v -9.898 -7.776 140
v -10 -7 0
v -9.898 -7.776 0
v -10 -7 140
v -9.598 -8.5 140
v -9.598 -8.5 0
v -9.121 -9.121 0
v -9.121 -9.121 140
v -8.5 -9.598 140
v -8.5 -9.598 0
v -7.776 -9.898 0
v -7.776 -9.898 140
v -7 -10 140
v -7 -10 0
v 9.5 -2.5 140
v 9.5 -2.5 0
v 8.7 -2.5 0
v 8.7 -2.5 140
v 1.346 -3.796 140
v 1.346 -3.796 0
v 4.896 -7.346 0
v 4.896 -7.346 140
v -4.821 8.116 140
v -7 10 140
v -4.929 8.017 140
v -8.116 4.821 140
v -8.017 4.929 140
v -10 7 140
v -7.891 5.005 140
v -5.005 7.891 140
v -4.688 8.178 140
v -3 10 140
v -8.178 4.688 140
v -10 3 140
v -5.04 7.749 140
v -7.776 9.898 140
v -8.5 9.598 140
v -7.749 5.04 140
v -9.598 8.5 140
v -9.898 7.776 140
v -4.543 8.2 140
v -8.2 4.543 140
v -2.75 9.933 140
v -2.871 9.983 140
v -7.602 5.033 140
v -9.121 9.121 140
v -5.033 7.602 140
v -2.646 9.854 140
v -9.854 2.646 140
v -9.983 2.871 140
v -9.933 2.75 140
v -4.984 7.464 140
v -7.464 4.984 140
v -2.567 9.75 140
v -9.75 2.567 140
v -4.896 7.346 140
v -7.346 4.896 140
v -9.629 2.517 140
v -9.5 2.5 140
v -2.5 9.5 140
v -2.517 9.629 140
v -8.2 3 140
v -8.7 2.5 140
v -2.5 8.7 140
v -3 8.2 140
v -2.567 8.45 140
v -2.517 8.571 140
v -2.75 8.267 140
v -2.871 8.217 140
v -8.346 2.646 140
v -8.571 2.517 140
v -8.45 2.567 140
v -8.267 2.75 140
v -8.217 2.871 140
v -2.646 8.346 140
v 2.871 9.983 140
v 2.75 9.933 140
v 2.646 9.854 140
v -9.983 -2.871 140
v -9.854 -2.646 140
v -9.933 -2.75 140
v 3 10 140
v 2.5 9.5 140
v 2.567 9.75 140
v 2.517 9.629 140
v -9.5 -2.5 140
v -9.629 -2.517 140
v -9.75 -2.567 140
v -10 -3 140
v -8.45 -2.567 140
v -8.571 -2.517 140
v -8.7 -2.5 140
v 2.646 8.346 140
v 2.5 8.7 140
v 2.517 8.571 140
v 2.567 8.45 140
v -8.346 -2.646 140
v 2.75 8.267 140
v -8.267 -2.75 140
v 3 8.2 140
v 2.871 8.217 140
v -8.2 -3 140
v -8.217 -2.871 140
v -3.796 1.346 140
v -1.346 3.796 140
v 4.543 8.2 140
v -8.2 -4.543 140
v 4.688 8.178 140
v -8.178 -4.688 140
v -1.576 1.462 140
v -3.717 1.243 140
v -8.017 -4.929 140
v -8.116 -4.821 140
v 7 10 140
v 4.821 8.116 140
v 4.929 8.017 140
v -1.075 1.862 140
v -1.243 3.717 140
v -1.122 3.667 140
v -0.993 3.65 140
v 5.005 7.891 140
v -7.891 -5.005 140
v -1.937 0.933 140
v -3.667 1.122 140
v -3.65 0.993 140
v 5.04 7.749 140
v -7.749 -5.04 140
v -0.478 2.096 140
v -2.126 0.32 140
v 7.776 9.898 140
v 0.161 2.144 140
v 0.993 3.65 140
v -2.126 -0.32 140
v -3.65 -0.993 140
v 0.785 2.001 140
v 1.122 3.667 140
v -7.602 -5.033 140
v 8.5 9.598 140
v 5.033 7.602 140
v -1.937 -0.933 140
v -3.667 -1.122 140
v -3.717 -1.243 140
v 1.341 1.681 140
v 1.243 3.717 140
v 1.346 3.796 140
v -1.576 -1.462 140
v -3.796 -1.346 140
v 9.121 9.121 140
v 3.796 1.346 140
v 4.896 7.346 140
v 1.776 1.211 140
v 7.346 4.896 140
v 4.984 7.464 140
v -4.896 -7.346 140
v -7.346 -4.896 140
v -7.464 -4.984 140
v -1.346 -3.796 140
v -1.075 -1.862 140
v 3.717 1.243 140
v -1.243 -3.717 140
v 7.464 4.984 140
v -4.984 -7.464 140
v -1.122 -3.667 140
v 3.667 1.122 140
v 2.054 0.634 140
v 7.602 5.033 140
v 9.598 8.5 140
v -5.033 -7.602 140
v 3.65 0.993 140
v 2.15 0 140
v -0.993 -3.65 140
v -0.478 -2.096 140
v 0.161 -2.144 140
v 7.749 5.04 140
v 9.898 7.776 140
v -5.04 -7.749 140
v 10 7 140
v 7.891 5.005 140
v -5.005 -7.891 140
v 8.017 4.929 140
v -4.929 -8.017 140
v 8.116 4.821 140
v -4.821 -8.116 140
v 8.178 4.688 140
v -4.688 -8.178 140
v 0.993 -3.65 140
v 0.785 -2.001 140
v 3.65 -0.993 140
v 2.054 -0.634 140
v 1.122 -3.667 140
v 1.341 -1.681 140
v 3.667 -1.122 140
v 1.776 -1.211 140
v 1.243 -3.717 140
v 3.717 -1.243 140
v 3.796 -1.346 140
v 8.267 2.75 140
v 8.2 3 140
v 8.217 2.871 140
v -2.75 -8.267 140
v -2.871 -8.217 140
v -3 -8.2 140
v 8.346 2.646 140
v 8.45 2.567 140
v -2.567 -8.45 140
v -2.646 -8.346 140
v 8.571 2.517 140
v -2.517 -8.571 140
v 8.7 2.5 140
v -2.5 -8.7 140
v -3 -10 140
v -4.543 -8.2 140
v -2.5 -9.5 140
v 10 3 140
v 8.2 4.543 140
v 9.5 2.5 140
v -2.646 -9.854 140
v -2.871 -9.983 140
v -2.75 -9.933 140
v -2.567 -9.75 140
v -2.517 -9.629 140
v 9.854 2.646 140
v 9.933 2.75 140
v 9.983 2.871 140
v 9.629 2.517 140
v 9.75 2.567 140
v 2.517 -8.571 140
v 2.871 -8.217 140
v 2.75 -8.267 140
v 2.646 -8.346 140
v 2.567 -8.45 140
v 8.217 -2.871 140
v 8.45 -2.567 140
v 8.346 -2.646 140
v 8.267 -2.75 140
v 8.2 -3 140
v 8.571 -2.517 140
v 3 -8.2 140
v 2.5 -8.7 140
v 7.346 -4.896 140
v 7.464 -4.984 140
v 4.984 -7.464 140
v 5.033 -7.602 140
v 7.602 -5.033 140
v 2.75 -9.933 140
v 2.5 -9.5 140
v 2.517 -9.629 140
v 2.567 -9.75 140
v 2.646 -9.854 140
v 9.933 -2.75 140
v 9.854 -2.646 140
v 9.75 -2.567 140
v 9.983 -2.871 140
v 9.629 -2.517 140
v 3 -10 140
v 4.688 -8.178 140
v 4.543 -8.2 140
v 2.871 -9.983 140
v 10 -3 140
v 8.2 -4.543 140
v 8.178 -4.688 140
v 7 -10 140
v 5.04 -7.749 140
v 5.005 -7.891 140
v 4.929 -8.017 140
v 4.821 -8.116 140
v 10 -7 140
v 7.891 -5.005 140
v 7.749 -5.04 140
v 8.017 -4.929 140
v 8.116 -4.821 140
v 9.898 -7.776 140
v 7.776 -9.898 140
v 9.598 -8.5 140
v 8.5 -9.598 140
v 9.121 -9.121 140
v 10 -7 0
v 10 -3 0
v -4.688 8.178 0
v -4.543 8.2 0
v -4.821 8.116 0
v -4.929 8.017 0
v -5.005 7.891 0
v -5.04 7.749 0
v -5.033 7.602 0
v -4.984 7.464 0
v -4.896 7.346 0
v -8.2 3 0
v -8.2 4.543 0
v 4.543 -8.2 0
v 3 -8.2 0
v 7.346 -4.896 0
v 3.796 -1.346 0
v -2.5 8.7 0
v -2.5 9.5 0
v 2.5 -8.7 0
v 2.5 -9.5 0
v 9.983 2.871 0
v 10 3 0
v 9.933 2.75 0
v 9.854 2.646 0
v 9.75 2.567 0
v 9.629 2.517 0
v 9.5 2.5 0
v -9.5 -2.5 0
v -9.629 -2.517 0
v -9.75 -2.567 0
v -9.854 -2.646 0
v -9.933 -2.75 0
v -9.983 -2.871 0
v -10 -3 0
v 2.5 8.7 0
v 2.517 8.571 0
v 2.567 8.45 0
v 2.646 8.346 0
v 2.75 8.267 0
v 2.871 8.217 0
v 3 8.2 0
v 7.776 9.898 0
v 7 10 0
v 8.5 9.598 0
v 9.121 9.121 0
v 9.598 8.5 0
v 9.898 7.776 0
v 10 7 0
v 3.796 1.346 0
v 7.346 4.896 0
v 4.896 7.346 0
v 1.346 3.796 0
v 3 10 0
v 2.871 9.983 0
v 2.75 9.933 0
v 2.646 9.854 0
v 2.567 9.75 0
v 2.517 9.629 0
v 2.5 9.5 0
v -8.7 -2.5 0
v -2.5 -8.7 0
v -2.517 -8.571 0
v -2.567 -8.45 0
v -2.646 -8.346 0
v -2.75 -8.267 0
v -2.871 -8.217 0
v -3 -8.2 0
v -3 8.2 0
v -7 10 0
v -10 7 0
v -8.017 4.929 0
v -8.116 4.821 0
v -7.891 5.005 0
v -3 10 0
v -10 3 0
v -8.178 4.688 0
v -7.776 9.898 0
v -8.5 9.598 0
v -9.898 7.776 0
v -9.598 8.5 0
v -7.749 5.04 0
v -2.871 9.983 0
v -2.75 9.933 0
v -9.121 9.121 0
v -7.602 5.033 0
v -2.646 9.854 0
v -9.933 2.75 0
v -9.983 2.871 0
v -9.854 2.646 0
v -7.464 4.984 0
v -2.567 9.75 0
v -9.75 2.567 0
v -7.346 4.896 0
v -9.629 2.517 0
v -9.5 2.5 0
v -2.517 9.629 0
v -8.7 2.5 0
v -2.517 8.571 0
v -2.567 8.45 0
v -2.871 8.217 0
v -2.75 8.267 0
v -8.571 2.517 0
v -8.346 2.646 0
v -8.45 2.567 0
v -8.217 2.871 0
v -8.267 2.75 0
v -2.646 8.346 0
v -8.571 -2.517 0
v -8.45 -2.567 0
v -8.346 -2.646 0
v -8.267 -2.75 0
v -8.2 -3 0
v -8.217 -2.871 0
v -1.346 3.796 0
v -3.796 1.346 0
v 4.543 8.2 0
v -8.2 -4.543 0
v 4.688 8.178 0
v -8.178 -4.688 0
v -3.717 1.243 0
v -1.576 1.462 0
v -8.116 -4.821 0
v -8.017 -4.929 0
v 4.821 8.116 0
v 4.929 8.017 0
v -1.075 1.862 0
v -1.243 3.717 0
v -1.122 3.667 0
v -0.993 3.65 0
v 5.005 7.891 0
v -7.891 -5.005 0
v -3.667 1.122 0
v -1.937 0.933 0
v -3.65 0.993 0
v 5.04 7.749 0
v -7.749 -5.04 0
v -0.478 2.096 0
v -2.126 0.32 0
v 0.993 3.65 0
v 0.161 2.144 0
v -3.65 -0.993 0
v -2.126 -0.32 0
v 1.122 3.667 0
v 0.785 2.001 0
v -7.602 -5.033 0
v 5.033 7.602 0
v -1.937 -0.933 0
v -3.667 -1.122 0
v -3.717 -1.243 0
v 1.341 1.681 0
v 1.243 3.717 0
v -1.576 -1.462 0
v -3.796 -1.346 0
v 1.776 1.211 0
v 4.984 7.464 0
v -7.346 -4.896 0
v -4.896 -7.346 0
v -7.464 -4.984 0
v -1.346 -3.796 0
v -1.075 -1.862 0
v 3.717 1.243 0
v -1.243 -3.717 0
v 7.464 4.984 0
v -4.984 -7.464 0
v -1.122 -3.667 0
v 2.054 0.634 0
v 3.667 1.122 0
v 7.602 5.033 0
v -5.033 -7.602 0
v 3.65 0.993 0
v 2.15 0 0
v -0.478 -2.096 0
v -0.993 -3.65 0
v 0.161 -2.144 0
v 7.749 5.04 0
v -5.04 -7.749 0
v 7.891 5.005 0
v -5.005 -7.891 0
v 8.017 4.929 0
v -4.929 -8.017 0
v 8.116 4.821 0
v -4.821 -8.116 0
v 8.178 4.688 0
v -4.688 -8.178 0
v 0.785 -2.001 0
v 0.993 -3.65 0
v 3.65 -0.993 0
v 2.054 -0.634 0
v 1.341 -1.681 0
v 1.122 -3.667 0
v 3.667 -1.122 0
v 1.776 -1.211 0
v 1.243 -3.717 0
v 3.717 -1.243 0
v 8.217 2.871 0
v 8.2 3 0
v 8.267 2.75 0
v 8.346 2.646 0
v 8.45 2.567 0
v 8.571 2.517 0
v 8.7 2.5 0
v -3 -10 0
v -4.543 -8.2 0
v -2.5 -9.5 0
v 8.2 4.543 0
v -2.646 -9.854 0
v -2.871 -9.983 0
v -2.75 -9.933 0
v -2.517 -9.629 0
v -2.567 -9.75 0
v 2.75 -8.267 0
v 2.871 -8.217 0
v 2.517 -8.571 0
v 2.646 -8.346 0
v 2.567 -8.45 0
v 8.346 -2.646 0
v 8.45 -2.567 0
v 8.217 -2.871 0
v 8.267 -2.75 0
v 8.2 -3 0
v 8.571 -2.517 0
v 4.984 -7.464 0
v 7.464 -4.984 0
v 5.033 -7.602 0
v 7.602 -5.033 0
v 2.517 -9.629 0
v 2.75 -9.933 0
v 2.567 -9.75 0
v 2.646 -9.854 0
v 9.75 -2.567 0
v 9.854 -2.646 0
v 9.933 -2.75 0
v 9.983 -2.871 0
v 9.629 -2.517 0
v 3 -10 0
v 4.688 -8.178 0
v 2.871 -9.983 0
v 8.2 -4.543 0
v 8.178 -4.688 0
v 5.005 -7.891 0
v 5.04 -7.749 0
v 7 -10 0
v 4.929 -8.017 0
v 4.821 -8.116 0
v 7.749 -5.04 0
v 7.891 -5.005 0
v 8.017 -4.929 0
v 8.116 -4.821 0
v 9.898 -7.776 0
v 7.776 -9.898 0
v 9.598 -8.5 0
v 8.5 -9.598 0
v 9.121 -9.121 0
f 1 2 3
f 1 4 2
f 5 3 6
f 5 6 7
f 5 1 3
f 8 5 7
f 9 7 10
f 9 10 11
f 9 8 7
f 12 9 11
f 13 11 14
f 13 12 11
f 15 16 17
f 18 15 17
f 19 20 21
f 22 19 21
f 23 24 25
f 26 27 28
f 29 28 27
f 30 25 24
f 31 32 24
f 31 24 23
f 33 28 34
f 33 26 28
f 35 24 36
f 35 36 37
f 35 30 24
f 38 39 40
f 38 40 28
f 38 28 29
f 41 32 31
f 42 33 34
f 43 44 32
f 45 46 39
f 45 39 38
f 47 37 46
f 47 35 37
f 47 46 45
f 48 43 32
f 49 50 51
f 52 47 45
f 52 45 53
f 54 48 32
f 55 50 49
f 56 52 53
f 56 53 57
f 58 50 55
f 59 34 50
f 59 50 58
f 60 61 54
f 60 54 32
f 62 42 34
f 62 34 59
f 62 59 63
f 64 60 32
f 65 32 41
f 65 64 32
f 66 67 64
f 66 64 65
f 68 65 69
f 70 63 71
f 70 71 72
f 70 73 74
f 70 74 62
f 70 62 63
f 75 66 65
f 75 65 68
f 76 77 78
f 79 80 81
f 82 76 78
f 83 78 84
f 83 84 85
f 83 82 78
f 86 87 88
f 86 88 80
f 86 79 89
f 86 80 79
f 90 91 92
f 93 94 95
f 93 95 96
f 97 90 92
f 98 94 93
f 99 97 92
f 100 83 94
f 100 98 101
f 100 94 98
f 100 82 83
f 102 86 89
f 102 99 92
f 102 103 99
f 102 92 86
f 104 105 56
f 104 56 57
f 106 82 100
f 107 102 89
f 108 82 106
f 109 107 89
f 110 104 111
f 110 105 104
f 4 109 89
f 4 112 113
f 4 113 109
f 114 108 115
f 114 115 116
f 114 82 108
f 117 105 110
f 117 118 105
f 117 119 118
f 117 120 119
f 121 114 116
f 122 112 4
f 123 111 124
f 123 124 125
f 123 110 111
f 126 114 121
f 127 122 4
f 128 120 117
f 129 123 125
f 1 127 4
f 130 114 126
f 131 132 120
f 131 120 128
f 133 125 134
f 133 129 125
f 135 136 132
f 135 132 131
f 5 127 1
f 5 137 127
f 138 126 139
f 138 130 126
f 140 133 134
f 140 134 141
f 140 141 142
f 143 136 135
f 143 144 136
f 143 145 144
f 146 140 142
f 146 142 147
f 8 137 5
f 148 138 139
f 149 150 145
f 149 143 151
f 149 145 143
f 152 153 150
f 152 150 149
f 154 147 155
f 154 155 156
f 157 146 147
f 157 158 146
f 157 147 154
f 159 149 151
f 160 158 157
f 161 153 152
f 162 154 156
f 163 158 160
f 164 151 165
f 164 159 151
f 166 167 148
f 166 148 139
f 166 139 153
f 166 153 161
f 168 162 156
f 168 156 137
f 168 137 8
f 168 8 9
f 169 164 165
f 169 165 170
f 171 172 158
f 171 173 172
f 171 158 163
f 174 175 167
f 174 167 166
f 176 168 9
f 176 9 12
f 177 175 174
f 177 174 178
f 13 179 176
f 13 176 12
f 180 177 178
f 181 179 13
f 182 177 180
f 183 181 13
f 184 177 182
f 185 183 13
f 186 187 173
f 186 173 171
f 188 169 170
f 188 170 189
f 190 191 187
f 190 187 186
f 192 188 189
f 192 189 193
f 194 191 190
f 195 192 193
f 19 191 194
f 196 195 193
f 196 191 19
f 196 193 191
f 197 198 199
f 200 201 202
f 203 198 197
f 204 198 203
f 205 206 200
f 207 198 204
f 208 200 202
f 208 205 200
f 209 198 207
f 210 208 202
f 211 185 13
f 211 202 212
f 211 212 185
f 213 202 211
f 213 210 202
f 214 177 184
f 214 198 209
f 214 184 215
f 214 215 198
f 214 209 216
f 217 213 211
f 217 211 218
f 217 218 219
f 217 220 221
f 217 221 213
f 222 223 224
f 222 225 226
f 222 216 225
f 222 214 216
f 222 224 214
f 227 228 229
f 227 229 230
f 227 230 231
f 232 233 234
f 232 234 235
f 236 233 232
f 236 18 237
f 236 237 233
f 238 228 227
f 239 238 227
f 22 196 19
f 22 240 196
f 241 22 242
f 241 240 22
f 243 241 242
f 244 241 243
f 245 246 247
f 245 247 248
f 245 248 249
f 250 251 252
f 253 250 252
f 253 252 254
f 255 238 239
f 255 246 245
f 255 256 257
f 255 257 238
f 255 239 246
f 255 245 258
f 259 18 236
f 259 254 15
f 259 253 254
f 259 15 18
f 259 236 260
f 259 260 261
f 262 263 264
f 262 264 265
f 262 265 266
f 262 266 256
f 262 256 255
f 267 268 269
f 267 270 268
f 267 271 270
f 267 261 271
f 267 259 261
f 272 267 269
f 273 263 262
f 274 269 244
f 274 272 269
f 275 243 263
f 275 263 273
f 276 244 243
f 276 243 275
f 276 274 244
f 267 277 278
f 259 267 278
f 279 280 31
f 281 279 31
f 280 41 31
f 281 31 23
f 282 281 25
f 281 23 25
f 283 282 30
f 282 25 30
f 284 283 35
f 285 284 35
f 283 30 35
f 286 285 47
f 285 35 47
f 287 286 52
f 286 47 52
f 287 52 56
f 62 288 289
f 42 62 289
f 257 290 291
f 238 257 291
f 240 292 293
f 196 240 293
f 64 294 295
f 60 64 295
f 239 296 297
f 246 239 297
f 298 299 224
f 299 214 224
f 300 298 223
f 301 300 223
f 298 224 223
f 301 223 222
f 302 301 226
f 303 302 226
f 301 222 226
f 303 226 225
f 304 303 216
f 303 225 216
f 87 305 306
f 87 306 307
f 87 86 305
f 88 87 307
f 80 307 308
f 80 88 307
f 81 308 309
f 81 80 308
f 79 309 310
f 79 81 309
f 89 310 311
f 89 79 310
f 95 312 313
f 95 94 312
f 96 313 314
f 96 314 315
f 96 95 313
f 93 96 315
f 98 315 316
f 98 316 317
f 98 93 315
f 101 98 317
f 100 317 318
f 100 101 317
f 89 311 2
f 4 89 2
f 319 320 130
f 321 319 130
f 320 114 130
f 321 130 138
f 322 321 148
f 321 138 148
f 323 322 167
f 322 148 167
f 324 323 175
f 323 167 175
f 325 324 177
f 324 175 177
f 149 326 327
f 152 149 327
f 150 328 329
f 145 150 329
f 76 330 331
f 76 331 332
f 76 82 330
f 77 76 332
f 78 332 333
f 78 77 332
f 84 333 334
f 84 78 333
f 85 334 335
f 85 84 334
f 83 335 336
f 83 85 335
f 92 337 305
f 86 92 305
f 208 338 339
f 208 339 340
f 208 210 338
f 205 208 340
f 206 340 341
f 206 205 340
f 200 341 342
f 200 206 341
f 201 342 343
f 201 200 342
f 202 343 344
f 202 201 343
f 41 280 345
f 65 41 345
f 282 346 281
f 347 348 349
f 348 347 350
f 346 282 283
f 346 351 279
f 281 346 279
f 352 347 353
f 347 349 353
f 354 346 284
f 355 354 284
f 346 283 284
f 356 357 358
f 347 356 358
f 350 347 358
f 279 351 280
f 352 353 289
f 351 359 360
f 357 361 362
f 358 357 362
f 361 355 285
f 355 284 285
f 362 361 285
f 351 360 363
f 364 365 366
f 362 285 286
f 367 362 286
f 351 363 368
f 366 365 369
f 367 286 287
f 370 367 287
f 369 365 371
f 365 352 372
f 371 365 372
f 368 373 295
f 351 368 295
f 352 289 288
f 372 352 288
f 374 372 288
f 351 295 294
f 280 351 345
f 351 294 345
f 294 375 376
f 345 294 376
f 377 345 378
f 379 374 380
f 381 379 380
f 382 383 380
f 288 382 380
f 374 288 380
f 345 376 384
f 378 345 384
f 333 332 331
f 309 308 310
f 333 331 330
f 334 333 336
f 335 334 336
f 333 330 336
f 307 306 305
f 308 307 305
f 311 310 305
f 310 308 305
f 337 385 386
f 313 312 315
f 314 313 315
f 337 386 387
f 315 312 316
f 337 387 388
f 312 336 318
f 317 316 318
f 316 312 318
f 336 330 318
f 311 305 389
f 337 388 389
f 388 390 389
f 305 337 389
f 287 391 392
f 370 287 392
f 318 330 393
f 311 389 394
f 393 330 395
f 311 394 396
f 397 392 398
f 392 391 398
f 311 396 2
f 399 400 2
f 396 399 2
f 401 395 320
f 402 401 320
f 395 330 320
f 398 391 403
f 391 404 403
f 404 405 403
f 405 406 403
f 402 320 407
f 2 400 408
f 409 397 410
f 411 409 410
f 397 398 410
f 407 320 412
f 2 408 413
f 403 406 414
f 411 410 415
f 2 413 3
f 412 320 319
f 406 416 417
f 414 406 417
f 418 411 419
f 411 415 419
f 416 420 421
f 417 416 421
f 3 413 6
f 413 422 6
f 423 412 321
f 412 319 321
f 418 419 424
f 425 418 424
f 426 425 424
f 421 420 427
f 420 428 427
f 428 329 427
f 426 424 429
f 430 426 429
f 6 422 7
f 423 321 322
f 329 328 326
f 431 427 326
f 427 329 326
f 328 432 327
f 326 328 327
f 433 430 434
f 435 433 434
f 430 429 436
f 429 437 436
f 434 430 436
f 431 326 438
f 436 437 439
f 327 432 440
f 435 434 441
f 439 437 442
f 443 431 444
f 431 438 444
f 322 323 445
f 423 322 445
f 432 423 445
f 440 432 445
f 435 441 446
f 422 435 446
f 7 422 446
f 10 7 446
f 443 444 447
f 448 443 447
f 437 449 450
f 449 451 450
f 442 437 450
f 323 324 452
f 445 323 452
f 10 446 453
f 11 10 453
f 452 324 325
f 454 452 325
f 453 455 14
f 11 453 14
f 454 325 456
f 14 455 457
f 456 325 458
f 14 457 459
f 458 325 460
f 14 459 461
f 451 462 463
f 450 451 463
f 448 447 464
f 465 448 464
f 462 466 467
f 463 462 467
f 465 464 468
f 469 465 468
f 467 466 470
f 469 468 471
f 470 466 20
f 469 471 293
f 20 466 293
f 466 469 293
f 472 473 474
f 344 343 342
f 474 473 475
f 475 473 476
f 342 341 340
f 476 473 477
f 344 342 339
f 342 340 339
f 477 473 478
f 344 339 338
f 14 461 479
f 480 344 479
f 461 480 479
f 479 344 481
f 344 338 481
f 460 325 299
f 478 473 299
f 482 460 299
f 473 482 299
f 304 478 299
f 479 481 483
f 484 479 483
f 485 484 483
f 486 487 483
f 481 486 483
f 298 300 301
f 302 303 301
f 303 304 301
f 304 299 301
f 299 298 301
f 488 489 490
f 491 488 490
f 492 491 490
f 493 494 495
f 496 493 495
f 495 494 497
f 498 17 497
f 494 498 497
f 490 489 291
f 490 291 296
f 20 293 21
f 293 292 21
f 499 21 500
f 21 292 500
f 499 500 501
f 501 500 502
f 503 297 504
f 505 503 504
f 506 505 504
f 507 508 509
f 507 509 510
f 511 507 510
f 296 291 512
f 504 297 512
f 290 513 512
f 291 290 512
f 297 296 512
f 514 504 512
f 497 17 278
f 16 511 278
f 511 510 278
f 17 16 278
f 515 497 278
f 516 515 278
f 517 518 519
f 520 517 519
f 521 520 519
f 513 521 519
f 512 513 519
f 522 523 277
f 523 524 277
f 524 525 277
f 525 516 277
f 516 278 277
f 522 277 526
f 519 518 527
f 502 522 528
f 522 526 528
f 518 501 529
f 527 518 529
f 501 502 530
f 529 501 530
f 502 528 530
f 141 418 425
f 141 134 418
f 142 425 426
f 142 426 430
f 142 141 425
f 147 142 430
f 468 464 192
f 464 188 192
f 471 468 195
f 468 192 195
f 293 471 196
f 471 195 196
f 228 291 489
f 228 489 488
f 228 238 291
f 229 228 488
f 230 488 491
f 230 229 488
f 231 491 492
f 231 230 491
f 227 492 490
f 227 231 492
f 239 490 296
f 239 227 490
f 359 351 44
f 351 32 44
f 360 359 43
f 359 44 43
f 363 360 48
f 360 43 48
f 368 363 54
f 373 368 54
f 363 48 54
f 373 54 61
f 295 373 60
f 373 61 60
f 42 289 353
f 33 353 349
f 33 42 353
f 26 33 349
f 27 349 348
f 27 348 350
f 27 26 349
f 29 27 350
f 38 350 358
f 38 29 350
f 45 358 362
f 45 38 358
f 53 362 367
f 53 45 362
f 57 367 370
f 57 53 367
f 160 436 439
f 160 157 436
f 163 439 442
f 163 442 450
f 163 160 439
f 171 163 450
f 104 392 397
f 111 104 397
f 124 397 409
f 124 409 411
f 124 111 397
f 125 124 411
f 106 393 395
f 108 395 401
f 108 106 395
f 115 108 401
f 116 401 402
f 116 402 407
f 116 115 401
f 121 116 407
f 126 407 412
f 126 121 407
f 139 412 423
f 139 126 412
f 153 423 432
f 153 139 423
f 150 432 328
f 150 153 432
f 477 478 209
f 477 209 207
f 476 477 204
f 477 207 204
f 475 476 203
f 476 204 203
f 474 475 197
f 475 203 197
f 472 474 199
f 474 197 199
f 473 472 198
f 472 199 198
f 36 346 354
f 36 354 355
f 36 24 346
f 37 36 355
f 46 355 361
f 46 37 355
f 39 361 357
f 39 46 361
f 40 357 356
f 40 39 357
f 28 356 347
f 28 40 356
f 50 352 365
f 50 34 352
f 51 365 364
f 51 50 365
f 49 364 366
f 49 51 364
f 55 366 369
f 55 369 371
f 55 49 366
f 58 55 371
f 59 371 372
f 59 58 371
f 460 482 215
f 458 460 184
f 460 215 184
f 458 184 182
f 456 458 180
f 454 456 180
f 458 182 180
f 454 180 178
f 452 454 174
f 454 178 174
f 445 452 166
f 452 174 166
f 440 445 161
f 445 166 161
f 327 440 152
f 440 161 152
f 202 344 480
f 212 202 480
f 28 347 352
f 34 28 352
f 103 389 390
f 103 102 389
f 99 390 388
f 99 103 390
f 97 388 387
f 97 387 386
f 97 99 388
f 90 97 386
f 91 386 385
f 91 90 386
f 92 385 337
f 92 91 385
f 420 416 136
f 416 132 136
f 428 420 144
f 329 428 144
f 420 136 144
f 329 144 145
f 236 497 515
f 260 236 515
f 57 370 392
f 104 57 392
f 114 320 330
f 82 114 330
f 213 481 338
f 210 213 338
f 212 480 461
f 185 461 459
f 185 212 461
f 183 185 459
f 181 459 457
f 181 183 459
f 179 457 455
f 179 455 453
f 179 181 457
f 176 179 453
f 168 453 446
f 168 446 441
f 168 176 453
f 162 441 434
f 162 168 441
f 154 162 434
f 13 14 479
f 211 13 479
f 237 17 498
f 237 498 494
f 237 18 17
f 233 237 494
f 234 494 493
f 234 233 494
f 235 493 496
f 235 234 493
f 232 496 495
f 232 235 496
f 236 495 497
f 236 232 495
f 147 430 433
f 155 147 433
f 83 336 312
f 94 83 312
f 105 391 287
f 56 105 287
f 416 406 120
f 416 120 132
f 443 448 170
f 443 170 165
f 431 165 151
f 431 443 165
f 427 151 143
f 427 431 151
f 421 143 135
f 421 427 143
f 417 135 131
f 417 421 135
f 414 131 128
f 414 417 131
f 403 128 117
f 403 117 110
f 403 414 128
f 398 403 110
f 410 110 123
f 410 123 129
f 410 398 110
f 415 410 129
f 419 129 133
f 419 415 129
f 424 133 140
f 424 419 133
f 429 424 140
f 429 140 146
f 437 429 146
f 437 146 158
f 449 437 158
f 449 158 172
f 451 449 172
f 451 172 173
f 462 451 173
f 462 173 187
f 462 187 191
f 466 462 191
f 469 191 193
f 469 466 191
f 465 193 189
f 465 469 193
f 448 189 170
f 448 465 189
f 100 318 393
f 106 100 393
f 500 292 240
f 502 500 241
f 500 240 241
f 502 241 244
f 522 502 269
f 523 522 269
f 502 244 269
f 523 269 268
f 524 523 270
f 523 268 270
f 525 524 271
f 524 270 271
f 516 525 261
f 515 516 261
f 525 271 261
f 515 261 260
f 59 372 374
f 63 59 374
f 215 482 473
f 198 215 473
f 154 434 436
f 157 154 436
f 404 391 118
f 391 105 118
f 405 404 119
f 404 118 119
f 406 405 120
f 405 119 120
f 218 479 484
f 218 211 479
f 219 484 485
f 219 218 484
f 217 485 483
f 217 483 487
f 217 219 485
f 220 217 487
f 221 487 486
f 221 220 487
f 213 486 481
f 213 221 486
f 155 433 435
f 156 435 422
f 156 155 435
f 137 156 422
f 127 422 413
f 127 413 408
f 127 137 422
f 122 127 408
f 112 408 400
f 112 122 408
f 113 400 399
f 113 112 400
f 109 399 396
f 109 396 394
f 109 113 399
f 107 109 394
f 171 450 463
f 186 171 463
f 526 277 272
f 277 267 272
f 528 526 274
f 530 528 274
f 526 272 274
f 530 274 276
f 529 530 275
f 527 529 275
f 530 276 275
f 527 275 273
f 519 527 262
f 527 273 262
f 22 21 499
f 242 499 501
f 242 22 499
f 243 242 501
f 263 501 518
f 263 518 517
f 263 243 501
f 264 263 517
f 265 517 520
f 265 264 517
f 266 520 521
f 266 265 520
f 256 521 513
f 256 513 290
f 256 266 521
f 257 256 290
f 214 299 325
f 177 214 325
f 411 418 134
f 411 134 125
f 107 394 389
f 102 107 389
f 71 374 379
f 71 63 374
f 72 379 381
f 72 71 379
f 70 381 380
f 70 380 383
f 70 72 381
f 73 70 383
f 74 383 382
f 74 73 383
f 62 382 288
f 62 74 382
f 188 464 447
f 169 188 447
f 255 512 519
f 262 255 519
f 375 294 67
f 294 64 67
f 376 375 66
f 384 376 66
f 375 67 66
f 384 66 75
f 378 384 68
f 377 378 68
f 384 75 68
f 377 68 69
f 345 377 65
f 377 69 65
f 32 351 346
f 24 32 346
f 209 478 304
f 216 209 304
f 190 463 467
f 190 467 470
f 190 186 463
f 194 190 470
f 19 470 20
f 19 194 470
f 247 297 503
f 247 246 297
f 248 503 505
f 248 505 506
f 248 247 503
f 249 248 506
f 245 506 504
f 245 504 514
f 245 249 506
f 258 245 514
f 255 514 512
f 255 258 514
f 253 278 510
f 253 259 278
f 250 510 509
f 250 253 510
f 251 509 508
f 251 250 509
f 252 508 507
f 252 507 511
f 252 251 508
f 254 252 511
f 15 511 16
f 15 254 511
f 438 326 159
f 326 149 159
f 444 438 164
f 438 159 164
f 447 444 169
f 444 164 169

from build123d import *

# Parameters (mm, degrees)
SKETCH_1_W                       = 7.3
SKETCH_1_H                       = 7.3
SKETCH_1_R                       = 2.15
EXTRUDE_1_DEPTH                  = 140
EXTRUDE_2_DEPTH                  = 140
FILLET_1_R                       = 3
FILLET_2_R                       = 0.5
PATTERN_CIRCULAR_3_COUNT         = 4
FILLET_1_OF_PATTERN_CIRCULAR_3_R = 3
FILLET_2_OF_PATTERN_CIRCULAR_3_R = 0.5
FILLET_3_R                       = 0.5


with BuildPart() as part:
    # 草图1 → 凸台-拉伸1 (new body)
    with BuildSketch(Plane.XY):
        Rectangle(SKETCH_1_W, SKETCH_1_H)
        Circle(SKETCH_1_R, mode=Mode.SUBTRACT)
    extrude(amount=EXTRUDE_1_DEPTH)

    # 草图2 → 凸台-拉伸2 (add)
    with BuildSketch(Plane.XY):
        Polygon((2.5, 10), (2.5, 8.2), (5.75, 8.2), (1.2, 3.65), (3.65, 3.65), (3.65, 1.2), (8.2, 5.75), (8.2, 2.5), (10, 2.5), (10, 10), align=None)
    extrude_2 = extrude(amount=EXTRUDE_2_DEPTH)

    # 圆角1
    fillet_1_edges = [part.edges().sort_by_distance(p)[0] for p in [
        (10, 10, 70),
    ]]
    fillet(fillet_1_edges, radius=FILLET_1_R)

    # 圆角2
    fillet_2_edges = [part.edges().sort_by_distance(p)[0] for p in [
        (2.5, 10, 70),
        (2.5, 8.2, 70),
        (5.75, 8.2, 70),
        (8.2, 5.75, 70),
        (8.2, 2.5, 70),
        (10, 2.5, 70),
    ]]
    fillet(fillet_2_edges, radius=FILLET_2_R)

    # 阵列(圆周)3: 凸台-拉伸2 ×4 about axis
    pattern_circular_3_axis = Axis((0, 0, 0), (0, 0, 1))
    for i in range(1, PATTERN_CIRCULAR_3_COUNT):
        add(extrude_2.rotate(pattern_circular_3_axis, i * 360 / PATTERN_CIRCULAR_3_COUNT))

    # 圆角1 of 阵列(圆周)3
    fillet_1_of_pattern_circular_3_edges = [part.edges().sort_by_distance(p)[0] for p in [
        (-10, 10, 70),
        (-10, -10, 70),
        (10, -10, 70),
    ]]
    fillet(fillet_1_of_pattern_circular_3_edges, radius=FILLET_1_OF_PATTERN_CIRCULAR_3_R)

    # 圆角2 of 阵列(圆周)3
    fillet_2_of_pattern_circular_3_edges = [part.edges().sort_by_distance(p)[0] for p in [
        (-10, 2.5, 70),
        (-8.2, 2.5, 70),
        (-8.2, 5.75, 70),
        (-5.75, 8.2, 70),
        (-2.5, 8.2, 70),
        (-2.5, 10, 70),
        (-2.5, -10, 70),
        (-2.5, -8.2, 70),
        (-5.75, -8.2, 70),
        (-8.2, -5.75, 70),
        (-8.2, -2.5, 70),
        (-10, -2.5, 70),
        (10, -2.5, 70),
        (8.2, -2.5, 70),
        (8.2, -5.75, 70),
        (5.75, -8.2, 70),
        (2.5, -8.2, 70),
        (2.5, -10, 70),
    ]]
    fillet(fillet_2_of_pattern_circular_3_edges, radius=FILLET_2_OF_PATTERN_CIRCULAR_3_R)

    # 圆角3
    fillet_3_edges = [part.edges().sort_by_distance(p)[0] for p in [
        (-1.2, -3.65, 70),
        (-3.65, -1.2, 70),
        (-3.65, 1.2, 70),
        (-1.2, 3.65, 70),
        (1.2, 3.65, 70),
        (3.65, 1.2, 70),
        (3.65, -1.2, 70),
        (1.2, -3.65, 70),
    ]]
    fillet(fillet_3_edges, radius=FILLET_3_R)


solid = part.part
